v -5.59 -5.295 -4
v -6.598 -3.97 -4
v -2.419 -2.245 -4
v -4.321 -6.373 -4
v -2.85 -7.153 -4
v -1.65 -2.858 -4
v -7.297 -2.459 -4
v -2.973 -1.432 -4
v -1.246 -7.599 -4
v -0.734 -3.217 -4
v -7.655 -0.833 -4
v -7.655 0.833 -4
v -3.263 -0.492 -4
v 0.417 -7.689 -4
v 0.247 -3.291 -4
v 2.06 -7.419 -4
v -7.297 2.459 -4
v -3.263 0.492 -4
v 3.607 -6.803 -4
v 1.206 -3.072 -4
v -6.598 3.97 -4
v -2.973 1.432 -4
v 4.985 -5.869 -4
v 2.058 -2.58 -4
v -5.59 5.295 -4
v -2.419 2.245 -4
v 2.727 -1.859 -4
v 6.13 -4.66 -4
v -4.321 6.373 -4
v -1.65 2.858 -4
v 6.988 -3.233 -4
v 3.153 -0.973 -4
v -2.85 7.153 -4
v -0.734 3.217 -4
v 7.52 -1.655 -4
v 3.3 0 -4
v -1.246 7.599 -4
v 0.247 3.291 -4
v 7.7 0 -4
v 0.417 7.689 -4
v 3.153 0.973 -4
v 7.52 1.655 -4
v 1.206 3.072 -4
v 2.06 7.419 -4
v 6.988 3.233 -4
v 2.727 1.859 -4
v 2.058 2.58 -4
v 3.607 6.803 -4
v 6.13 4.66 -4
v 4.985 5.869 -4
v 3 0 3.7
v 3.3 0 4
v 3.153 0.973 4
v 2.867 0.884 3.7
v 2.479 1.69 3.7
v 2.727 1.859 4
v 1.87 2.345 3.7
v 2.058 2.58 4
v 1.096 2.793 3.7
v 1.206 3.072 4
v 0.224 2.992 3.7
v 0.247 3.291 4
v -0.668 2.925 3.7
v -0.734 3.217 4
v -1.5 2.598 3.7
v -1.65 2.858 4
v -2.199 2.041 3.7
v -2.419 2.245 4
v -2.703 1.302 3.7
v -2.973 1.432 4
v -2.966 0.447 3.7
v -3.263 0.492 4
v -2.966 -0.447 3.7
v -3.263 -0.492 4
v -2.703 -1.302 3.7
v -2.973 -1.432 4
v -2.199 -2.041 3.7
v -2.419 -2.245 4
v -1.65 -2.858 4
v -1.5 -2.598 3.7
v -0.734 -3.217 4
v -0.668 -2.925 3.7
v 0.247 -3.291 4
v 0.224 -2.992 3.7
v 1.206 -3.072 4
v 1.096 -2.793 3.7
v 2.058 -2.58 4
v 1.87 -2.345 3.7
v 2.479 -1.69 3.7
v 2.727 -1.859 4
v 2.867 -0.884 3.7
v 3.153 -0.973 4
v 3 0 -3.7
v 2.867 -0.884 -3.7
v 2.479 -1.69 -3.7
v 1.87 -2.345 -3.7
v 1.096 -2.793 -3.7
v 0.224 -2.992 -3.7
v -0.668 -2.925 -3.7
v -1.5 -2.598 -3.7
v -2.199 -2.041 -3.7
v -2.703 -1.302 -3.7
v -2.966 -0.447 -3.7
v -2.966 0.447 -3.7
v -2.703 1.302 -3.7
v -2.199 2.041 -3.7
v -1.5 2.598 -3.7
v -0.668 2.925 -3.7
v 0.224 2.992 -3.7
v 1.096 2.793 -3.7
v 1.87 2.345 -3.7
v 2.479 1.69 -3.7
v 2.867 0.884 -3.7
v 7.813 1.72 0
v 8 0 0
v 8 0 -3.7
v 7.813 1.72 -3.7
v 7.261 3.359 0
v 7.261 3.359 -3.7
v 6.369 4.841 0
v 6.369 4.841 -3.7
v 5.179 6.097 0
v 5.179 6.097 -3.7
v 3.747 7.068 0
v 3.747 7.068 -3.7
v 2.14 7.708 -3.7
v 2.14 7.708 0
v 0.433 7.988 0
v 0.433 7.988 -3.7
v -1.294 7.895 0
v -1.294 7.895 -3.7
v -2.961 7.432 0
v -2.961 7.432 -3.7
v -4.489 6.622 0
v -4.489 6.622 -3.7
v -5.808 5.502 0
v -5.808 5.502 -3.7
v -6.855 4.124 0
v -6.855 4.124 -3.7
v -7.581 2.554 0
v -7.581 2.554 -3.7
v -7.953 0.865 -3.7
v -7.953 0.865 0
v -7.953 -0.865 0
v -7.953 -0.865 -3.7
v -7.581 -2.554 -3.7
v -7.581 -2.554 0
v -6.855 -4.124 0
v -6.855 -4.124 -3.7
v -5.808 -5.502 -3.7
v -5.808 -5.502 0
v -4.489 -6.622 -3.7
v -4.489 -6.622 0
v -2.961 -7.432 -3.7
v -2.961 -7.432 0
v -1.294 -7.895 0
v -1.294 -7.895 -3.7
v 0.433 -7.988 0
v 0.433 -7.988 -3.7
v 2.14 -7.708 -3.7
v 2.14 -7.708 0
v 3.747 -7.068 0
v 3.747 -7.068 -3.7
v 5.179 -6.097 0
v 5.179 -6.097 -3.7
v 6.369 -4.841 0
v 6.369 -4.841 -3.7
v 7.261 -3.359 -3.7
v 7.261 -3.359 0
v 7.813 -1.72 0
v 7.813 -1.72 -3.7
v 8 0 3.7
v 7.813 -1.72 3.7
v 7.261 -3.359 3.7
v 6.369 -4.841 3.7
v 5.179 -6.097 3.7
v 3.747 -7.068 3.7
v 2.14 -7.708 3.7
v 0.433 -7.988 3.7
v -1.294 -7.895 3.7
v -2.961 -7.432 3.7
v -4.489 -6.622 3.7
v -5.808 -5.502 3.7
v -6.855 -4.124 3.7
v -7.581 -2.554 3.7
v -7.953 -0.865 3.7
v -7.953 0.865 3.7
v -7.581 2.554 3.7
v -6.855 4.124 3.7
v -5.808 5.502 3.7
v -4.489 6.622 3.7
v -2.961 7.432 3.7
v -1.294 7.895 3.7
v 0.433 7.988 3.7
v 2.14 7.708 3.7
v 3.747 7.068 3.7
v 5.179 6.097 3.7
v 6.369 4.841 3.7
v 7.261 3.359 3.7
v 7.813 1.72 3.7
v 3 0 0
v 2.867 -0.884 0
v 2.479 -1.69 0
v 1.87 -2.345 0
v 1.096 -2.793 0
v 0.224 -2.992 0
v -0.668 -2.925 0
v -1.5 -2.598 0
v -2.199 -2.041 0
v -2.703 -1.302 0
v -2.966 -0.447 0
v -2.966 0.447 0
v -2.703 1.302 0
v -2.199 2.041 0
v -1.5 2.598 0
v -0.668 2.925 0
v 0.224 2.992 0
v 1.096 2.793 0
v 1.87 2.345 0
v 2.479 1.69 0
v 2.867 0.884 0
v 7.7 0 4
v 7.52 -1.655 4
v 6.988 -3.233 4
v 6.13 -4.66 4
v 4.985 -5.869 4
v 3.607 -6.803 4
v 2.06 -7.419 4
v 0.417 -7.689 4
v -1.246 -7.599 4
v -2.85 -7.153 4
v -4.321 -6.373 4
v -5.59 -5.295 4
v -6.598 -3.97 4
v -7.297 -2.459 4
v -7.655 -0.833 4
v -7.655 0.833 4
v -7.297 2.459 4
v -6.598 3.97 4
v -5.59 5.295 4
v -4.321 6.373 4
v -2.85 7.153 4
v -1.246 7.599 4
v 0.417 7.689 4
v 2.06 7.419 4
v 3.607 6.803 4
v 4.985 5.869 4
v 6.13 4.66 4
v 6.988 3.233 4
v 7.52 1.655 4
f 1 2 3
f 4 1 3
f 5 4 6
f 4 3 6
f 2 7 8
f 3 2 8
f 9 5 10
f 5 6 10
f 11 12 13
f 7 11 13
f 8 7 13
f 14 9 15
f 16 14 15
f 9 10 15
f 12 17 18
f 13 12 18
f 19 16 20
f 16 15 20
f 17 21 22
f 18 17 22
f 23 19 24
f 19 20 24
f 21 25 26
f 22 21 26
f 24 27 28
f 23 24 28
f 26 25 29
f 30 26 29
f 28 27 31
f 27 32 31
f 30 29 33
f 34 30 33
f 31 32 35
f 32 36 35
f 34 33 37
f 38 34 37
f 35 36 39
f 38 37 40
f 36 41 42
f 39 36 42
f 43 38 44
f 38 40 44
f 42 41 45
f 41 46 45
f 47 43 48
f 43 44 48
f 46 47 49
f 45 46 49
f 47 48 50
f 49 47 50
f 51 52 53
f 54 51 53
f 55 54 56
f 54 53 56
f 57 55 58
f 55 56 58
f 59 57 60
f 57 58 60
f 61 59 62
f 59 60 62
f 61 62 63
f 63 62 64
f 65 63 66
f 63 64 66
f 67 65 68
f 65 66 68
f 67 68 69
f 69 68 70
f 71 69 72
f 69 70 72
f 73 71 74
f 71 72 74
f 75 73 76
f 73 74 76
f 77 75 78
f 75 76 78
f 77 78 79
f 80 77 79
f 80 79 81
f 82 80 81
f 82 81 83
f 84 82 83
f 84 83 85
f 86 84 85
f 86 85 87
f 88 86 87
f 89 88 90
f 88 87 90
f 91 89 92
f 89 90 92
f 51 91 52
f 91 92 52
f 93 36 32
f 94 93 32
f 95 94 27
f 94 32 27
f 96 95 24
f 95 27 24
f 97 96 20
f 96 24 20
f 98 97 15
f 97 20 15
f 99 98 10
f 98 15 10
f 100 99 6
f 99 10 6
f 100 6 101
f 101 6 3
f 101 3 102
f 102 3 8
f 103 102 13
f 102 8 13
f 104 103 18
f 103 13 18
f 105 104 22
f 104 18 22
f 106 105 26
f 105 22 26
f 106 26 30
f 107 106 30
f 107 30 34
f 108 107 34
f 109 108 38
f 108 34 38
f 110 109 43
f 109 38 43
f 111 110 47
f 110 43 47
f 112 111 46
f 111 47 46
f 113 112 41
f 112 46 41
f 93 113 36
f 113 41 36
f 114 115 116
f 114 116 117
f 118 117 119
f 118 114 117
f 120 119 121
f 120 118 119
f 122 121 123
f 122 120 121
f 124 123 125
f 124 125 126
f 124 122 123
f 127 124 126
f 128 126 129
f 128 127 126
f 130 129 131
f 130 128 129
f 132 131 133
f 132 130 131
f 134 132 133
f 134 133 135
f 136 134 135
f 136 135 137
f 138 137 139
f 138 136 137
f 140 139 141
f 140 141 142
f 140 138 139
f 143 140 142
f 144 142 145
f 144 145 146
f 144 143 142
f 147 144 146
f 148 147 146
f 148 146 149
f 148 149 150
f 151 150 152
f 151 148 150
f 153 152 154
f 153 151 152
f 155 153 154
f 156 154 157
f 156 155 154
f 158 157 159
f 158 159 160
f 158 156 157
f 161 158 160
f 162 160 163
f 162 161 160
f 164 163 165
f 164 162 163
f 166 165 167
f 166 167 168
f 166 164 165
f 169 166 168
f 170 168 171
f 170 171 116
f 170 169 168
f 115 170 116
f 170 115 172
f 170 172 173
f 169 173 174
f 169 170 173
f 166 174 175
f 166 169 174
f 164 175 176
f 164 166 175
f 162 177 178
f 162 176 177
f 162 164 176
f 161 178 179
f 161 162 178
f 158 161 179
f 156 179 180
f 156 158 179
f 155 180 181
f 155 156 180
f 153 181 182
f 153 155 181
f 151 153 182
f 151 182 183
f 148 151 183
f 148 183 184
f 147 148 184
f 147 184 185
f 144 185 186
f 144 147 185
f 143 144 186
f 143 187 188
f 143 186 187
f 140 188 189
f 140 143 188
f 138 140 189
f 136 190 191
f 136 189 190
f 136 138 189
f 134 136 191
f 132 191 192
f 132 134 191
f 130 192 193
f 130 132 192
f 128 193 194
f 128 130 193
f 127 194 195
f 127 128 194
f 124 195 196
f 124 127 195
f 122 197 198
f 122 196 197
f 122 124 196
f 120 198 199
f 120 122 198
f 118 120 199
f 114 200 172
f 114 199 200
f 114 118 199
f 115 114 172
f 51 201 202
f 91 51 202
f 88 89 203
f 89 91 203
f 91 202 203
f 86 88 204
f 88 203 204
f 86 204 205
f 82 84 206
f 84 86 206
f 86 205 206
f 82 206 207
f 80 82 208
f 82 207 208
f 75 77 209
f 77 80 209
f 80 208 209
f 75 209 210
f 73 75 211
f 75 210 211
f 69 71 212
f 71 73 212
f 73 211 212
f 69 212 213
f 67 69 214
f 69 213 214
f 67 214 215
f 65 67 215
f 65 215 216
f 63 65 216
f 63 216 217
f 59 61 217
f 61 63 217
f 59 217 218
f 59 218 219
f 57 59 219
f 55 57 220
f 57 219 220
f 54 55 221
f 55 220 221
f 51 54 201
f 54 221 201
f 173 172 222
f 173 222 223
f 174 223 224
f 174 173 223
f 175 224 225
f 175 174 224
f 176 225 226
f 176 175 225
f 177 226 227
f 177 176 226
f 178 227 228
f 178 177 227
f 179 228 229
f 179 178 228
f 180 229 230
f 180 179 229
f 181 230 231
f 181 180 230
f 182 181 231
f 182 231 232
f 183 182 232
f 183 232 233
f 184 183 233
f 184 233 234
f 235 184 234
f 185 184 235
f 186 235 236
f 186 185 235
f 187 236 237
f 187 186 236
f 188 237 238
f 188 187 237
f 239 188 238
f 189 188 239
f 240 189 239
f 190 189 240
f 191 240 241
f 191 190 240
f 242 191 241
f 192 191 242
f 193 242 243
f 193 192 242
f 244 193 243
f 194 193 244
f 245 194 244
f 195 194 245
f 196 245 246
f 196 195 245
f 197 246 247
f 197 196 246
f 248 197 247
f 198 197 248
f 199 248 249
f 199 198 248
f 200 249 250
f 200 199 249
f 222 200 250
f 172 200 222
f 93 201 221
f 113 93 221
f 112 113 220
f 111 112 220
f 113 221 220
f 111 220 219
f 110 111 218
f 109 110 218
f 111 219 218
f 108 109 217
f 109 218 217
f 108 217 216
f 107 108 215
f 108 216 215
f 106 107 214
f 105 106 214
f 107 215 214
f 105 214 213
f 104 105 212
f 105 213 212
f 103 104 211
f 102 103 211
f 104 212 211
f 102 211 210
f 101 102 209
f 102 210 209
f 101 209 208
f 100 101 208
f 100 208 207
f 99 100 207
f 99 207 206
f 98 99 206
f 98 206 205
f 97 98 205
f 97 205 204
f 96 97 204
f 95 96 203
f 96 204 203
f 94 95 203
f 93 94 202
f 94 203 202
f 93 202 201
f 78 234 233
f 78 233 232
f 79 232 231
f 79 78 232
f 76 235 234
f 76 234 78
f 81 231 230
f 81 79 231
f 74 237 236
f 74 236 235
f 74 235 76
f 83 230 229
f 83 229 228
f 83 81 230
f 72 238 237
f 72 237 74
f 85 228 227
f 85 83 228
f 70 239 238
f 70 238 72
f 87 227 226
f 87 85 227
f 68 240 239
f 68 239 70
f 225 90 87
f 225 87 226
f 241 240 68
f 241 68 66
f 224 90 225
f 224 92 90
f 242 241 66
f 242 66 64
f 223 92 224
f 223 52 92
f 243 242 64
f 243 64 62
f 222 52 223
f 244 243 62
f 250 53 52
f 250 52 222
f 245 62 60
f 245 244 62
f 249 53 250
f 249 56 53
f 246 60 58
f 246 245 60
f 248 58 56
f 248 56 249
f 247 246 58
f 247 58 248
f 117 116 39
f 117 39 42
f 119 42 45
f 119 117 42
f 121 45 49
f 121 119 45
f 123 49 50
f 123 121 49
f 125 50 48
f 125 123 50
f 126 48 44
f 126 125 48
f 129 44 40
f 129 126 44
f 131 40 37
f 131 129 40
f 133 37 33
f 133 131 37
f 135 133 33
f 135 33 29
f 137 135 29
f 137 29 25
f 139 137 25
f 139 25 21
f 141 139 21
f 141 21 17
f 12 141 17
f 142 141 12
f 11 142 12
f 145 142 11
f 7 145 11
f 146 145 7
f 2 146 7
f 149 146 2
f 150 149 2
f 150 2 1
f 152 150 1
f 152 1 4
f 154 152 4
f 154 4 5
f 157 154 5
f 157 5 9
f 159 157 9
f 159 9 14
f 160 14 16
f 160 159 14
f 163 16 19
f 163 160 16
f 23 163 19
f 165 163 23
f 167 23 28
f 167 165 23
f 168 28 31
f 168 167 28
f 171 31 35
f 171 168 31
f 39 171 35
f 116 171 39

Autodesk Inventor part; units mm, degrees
ref_plane "YZ Plane" through (0, 0, 0) normal (1, 0, 0) x (0, 1, 0)
ref_plane "XZ Plane" through (0, 0, 0) normal (0, 1, 0) x (-1, 0, 0)
ref_plane "XY Plane" through (0, 0, 0) normal (0, 0, 1) x (1, 0, 0)
sketch "Esboço1" plane through (0, 0, 0) normal (0, 0, 1) x (1, 0, 0)
  circle A0 centre (0, 0) radius 3
  circle A1 centre (0, 0) radius 8
  dimension "d0" = 6
  dimension "d1" = 16
extrude "Extrusão1" add sketch "Esboço1" along normal mid plane 8
chamfer "Chanfro1" distance 0.3 angle 45 4 edges at (-3, 0, 4) (-8, 0, 4) (-8, 0, -4) (-3, 0, -4)
